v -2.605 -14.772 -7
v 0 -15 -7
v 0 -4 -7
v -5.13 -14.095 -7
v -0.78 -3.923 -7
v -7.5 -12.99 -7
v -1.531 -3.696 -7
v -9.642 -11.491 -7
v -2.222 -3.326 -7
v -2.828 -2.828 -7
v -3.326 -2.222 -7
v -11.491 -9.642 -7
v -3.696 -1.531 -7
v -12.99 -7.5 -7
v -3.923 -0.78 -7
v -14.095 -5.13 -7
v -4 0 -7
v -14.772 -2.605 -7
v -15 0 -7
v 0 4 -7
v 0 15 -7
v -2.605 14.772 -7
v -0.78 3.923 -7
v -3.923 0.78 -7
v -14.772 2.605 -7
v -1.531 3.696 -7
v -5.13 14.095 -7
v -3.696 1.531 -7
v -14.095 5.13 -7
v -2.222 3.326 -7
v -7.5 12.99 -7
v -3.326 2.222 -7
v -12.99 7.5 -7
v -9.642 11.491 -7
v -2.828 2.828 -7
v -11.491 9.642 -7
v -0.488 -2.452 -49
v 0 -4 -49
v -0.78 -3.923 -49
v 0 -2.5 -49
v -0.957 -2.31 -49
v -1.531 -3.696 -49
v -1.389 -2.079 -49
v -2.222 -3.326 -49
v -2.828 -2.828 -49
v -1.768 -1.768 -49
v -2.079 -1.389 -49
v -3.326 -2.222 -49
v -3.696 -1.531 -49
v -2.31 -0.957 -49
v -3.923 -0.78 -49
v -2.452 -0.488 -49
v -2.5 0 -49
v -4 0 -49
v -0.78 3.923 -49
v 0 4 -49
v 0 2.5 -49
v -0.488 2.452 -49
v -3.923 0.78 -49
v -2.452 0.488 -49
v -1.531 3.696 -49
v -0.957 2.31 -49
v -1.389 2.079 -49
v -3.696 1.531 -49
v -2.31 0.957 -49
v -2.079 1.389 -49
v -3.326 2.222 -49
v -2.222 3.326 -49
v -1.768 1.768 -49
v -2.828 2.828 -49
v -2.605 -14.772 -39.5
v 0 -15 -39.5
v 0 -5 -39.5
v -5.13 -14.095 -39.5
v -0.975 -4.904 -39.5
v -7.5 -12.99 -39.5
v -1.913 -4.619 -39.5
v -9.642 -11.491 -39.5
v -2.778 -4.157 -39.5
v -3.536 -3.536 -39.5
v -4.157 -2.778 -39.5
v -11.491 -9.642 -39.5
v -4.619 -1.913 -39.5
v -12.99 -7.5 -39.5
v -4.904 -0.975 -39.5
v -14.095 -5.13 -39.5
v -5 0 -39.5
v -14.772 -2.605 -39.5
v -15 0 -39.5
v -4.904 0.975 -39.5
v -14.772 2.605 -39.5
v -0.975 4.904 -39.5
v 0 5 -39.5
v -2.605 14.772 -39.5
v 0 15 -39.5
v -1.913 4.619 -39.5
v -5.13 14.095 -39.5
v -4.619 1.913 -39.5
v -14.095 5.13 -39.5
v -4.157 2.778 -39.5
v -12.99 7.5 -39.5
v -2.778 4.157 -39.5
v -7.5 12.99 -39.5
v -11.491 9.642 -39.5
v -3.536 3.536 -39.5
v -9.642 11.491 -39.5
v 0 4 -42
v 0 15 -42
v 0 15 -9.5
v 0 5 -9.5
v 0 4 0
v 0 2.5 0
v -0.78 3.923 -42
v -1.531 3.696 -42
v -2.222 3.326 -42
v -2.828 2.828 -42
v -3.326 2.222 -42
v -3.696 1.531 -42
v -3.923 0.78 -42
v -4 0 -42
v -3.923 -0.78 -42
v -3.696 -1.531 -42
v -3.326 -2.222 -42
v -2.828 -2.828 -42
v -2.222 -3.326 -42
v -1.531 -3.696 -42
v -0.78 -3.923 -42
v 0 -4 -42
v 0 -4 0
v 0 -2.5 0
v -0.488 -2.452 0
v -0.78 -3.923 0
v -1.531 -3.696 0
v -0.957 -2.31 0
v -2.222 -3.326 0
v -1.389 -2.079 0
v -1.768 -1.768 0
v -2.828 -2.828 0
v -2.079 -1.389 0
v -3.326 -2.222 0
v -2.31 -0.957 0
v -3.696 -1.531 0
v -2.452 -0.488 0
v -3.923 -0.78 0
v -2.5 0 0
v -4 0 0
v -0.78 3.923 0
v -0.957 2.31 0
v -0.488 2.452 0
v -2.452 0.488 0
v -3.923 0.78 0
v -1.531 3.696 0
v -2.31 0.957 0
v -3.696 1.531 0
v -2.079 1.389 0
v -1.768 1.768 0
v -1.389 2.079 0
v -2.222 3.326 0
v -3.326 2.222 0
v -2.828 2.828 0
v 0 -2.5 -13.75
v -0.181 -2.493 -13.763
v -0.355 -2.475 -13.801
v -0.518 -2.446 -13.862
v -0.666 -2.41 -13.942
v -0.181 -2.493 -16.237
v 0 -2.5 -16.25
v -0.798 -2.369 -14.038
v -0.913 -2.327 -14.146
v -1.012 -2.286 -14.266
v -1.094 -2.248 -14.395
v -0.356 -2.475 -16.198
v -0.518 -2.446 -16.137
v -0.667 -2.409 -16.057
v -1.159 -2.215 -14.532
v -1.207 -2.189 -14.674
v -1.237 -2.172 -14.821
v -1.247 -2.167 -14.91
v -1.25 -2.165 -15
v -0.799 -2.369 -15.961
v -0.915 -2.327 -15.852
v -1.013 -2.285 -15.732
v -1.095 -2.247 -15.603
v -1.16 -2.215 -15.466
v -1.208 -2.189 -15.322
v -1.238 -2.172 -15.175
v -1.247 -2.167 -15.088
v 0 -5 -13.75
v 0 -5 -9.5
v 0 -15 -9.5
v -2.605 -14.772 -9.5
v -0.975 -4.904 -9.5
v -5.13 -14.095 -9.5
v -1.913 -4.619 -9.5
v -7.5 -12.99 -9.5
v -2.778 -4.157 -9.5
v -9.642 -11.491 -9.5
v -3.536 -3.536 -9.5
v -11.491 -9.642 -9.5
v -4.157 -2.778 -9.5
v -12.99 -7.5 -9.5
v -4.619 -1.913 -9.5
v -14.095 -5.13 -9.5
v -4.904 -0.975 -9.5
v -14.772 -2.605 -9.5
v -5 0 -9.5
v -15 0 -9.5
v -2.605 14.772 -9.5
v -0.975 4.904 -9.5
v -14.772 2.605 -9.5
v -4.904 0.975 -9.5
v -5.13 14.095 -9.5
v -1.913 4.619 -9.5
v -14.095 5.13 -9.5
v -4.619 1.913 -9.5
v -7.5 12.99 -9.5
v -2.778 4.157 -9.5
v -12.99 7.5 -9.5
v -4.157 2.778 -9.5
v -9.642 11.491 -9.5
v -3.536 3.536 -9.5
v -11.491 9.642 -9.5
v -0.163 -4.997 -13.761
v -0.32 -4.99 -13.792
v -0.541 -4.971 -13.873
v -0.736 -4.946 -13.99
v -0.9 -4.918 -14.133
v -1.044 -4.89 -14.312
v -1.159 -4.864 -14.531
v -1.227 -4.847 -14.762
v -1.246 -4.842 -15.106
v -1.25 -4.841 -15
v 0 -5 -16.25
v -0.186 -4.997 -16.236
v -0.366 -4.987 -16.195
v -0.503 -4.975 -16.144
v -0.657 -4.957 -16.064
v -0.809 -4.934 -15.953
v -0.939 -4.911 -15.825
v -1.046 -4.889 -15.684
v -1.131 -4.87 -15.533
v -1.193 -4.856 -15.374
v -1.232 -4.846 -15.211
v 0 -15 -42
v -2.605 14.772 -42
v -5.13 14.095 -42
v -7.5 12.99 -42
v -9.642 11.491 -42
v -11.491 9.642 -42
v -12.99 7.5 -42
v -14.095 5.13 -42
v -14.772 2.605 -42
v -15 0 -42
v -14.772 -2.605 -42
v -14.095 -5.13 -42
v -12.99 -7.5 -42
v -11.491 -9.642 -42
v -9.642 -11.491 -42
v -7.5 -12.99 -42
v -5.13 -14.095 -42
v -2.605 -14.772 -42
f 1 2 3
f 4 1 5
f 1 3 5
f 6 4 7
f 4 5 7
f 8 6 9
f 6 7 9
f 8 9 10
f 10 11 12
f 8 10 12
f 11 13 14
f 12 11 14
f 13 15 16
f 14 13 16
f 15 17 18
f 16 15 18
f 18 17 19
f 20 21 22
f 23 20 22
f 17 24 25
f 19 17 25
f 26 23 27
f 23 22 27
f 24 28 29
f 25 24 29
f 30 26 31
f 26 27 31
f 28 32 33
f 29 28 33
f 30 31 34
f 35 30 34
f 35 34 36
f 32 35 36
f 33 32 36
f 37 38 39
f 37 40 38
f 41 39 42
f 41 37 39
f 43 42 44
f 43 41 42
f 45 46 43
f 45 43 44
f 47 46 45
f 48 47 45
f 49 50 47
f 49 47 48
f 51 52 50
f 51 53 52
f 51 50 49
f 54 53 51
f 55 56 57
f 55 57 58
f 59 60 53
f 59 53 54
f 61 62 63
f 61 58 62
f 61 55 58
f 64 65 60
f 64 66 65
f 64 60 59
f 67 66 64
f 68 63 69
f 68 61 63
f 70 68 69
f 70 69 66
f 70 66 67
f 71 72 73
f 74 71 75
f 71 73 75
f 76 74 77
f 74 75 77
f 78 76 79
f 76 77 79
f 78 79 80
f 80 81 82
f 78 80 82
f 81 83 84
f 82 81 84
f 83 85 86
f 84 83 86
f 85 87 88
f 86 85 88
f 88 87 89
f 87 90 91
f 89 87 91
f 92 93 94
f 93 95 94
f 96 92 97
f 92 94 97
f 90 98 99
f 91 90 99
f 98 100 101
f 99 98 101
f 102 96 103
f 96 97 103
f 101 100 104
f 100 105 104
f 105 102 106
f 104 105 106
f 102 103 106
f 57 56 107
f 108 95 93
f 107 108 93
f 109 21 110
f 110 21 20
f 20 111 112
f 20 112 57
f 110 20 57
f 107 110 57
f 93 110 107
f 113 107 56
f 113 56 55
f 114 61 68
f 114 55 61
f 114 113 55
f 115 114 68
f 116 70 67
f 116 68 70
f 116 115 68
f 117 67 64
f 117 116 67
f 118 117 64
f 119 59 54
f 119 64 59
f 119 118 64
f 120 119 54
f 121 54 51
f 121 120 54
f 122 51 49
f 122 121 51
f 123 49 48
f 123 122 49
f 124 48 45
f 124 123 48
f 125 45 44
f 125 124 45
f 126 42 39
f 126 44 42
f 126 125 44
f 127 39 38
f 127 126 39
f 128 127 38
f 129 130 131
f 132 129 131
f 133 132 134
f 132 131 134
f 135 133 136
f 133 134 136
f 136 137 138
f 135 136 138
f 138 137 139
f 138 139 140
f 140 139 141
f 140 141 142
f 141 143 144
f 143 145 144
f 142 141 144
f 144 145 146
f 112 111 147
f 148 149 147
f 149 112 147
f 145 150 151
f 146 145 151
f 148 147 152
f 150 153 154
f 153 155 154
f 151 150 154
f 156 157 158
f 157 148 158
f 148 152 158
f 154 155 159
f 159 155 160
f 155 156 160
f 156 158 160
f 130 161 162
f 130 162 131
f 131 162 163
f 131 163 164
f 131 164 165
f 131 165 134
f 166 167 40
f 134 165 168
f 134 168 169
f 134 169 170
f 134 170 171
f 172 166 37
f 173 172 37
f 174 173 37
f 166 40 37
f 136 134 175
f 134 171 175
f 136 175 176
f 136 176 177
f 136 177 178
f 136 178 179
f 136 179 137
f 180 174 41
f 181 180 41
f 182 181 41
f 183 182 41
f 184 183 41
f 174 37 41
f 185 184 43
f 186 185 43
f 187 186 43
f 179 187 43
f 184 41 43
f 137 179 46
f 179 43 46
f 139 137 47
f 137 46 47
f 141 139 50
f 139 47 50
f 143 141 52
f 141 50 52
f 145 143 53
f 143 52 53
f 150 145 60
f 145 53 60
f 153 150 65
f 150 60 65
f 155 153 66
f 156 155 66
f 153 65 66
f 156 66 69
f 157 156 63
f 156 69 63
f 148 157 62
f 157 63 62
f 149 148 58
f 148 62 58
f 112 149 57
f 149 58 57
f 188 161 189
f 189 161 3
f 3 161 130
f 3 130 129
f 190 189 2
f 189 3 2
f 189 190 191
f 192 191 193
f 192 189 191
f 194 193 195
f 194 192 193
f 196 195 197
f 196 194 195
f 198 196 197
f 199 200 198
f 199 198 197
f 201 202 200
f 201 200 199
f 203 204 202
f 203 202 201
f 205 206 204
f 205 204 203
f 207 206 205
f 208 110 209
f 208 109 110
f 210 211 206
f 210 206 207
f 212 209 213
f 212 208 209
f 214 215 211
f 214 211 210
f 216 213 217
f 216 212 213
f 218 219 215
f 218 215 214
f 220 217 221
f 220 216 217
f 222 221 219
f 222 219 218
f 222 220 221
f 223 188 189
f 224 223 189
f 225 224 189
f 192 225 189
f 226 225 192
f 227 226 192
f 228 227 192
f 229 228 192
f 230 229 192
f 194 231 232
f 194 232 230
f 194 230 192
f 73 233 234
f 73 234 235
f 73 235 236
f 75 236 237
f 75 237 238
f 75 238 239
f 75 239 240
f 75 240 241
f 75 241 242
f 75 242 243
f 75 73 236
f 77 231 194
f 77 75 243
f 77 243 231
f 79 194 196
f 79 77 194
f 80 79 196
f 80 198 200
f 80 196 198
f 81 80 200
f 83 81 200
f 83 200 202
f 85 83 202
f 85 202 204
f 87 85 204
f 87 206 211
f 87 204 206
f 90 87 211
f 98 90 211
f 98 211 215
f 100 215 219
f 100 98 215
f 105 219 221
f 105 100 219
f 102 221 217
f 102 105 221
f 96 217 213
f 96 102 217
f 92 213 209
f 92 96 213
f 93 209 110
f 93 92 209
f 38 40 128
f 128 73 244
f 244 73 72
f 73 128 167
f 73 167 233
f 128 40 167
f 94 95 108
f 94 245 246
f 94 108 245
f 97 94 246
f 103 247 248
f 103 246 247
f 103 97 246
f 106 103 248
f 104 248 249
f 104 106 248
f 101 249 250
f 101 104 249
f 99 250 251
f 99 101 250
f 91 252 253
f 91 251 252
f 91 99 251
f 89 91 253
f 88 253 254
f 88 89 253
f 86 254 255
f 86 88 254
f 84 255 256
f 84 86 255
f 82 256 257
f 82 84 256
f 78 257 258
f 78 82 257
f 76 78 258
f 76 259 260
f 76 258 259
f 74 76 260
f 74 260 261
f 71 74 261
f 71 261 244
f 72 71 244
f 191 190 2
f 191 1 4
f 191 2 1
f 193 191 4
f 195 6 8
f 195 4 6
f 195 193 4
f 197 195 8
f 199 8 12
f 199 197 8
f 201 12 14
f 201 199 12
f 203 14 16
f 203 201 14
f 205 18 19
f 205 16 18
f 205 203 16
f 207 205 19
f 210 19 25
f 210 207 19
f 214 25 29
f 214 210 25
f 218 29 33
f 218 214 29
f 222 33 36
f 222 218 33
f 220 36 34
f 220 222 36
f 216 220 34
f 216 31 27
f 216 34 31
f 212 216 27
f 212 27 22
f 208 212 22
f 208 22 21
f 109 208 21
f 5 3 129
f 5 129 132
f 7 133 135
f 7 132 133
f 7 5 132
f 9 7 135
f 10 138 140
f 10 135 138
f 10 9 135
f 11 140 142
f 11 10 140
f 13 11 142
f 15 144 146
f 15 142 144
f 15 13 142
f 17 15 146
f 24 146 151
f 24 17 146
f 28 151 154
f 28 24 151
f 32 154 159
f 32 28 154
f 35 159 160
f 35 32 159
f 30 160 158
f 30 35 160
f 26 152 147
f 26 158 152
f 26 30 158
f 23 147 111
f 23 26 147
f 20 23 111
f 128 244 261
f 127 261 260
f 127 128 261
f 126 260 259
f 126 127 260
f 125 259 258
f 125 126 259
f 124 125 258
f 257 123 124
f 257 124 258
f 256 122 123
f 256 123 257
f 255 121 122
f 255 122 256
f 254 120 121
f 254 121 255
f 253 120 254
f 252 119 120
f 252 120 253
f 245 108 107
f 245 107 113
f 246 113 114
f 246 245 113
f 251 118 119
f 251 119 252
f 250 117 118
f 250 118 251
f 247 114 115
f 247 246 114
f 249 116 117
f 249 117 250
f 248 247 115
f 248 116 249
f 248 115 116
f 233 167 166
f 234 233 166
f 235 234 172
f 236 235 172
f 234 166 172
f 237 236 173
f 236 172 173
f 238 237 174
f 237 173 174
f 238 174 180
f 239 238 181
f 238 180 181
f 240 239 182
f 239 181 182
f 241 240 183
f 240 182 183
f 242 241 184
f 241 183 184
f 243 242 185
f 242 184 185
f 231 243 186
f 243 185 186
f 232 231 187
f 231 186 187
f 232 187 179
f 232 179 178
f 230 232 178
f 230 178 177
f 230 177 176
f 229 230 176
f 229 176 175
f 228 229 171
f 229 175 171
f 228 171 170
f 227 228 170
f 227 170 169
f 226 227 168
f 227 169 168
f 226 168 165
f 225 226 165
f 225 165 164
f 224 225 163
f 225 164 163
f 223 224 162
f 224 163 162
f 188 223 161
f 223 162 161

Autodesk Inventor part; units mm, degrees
ref_plane "YZ Plane" through (0, 0, 0) normal (1, 0, 0) x (0, 1, 0)
ref_plane "XZ Plane" through (0, 0, 0) normal (0, 1, 0) x (-1, 0, 0)
ref_plane "XY Plane" through (0, 0, 0) normal (0, 0, 1) x (1, 0, 0)
sketch "Sketch1" plane through (0, 0, 0) normal (0, 1, 0) x (-1, 0, 0)
  line L0 (0, 0) -> (2.5, 0)
  line L1 (2.5, 0) -> (2.5, -7)
  line L2 (0, 0) -> (4, 0)
  line L3 (4, 0) -> (4, -7)
  line L4 (2.5, -7) -> (4, -7)
  line L5 (4, -7) -> (4, 0)
  line L6 (4, 0) -> (2.5, 0)
  line L7 (2.5, 0) -> (2.5, -7)
  line L8 (2.5, -7) -> (15, -7)
  line L9 (15, -7) -> (15, -9.5)
  line L10 (15, -9.5) -> (2.5, -9.5)
  line L11 (2.5, -9.5) -> (2.5, -7)
  line L12 (2.5, -9.5) -> (5, -9.5)
  line L13 (5, -9.5) -> (5, -39.5)
  line L14 (5, -39.5) -> (2.5, -39.5)
  line L15 (2.5, -39.5) -> (2.5, -9.5)
  line L16 (5, -24.5) -> (-8.9655, -24.5)
  line L17 (0, -49) -> (2.5, -49)
  line L18 (2.5, -49) -> (2.5, -42)
  line L19 (0, -49) -> (4, -49)
  line L20 (4, -49) -> (4, -42)
  line L21 (2.5, -42) -> (4, -42)
  line L22 (4, -42) -> (4, -49)
  line L23 (4, -49) -> (2.5, -49)
  line L24 (2.5, -49) -> (2.5, -42)
  line L25 (2.5, -42) -> (15, -42)
  line L26 (15, -42) -> (15, -39.5)
  line L27 (15, -39.5) -> (2.5, -39.5)
  line L28 (2.5, -39.5) -> (2.5, -42)
  line L29 (2.5, -39.5) -> (5, -39.5)
  line L30 (0, 0) -> (0, -54.8818)
  dimension "d0" = 2.5
  dimension "d1" = 7
  dimension "d2" = 90
  dimension "d3" = 4
  dimension "d4" = 12.5
  dimension "d5" = 2.5
  dimension "d6" = 2.5
  dimension "d7" = 30
revolve "Revolution1" add sketch "Sketch1" angle 360 about axis through (0, 0, 0) along (0, 0, -1) contours L2 L3 L4 L1 | L4 L8 L9 L10 L11 | L16 L13 L14 L15 | L15 L10 L13 L16 | L14 L27 L26 L25 L21 L28 | L18 L21 L20 L19
sketch "Sketch2" plane through (0, 0, 0) normal (0, 1, 0) x (-1, 0, 0)
  line L0 (0, 0) -> (0, -15)
  line L1 (0, 0) -> (15, 0) construction
  circle A0 centre (0, -15) radius 1.25
  dimension "d9" = 15
  dimension "d10" = 90
  dimension "d11" = 2.5
extrude "Extrusion1" cut sketch "Sketch2" against normal blind 10
sketch "Sketch3" plane through (0, 0, 0) normal (0, 0, 1) x (1, 0, 0)
  circle A0 centre (0, 0) radius 4 projected
  line L0 (0, 0) -> (24.6363, 0)
  line L1 (24.6363, 0) -> (24.6363, -18.6963)
  line L2 (24.6363, -18.6963) -> (0, -18.6963)
  line L3 (0, -18.6963) -> (0, 0)
  line L4 (0, 0) -> (27.3141, 0)
  line L5 (27.3141, 0) -> (27.3141, 19.6701)
  line L6 (27.3141, 19.6701) -> (0, 19.6701)
  line L7 (0, 19.6701) -> (0, 0)
extrude "Extrusion2" cut sketch "Sketch3" against normal blind 100 contours L0 L7 A0 | L0 L1 L2 L3 A0 | A0 L3 L0 | A0 L7 L6 L5 L4 L0
properties part number "spool"
